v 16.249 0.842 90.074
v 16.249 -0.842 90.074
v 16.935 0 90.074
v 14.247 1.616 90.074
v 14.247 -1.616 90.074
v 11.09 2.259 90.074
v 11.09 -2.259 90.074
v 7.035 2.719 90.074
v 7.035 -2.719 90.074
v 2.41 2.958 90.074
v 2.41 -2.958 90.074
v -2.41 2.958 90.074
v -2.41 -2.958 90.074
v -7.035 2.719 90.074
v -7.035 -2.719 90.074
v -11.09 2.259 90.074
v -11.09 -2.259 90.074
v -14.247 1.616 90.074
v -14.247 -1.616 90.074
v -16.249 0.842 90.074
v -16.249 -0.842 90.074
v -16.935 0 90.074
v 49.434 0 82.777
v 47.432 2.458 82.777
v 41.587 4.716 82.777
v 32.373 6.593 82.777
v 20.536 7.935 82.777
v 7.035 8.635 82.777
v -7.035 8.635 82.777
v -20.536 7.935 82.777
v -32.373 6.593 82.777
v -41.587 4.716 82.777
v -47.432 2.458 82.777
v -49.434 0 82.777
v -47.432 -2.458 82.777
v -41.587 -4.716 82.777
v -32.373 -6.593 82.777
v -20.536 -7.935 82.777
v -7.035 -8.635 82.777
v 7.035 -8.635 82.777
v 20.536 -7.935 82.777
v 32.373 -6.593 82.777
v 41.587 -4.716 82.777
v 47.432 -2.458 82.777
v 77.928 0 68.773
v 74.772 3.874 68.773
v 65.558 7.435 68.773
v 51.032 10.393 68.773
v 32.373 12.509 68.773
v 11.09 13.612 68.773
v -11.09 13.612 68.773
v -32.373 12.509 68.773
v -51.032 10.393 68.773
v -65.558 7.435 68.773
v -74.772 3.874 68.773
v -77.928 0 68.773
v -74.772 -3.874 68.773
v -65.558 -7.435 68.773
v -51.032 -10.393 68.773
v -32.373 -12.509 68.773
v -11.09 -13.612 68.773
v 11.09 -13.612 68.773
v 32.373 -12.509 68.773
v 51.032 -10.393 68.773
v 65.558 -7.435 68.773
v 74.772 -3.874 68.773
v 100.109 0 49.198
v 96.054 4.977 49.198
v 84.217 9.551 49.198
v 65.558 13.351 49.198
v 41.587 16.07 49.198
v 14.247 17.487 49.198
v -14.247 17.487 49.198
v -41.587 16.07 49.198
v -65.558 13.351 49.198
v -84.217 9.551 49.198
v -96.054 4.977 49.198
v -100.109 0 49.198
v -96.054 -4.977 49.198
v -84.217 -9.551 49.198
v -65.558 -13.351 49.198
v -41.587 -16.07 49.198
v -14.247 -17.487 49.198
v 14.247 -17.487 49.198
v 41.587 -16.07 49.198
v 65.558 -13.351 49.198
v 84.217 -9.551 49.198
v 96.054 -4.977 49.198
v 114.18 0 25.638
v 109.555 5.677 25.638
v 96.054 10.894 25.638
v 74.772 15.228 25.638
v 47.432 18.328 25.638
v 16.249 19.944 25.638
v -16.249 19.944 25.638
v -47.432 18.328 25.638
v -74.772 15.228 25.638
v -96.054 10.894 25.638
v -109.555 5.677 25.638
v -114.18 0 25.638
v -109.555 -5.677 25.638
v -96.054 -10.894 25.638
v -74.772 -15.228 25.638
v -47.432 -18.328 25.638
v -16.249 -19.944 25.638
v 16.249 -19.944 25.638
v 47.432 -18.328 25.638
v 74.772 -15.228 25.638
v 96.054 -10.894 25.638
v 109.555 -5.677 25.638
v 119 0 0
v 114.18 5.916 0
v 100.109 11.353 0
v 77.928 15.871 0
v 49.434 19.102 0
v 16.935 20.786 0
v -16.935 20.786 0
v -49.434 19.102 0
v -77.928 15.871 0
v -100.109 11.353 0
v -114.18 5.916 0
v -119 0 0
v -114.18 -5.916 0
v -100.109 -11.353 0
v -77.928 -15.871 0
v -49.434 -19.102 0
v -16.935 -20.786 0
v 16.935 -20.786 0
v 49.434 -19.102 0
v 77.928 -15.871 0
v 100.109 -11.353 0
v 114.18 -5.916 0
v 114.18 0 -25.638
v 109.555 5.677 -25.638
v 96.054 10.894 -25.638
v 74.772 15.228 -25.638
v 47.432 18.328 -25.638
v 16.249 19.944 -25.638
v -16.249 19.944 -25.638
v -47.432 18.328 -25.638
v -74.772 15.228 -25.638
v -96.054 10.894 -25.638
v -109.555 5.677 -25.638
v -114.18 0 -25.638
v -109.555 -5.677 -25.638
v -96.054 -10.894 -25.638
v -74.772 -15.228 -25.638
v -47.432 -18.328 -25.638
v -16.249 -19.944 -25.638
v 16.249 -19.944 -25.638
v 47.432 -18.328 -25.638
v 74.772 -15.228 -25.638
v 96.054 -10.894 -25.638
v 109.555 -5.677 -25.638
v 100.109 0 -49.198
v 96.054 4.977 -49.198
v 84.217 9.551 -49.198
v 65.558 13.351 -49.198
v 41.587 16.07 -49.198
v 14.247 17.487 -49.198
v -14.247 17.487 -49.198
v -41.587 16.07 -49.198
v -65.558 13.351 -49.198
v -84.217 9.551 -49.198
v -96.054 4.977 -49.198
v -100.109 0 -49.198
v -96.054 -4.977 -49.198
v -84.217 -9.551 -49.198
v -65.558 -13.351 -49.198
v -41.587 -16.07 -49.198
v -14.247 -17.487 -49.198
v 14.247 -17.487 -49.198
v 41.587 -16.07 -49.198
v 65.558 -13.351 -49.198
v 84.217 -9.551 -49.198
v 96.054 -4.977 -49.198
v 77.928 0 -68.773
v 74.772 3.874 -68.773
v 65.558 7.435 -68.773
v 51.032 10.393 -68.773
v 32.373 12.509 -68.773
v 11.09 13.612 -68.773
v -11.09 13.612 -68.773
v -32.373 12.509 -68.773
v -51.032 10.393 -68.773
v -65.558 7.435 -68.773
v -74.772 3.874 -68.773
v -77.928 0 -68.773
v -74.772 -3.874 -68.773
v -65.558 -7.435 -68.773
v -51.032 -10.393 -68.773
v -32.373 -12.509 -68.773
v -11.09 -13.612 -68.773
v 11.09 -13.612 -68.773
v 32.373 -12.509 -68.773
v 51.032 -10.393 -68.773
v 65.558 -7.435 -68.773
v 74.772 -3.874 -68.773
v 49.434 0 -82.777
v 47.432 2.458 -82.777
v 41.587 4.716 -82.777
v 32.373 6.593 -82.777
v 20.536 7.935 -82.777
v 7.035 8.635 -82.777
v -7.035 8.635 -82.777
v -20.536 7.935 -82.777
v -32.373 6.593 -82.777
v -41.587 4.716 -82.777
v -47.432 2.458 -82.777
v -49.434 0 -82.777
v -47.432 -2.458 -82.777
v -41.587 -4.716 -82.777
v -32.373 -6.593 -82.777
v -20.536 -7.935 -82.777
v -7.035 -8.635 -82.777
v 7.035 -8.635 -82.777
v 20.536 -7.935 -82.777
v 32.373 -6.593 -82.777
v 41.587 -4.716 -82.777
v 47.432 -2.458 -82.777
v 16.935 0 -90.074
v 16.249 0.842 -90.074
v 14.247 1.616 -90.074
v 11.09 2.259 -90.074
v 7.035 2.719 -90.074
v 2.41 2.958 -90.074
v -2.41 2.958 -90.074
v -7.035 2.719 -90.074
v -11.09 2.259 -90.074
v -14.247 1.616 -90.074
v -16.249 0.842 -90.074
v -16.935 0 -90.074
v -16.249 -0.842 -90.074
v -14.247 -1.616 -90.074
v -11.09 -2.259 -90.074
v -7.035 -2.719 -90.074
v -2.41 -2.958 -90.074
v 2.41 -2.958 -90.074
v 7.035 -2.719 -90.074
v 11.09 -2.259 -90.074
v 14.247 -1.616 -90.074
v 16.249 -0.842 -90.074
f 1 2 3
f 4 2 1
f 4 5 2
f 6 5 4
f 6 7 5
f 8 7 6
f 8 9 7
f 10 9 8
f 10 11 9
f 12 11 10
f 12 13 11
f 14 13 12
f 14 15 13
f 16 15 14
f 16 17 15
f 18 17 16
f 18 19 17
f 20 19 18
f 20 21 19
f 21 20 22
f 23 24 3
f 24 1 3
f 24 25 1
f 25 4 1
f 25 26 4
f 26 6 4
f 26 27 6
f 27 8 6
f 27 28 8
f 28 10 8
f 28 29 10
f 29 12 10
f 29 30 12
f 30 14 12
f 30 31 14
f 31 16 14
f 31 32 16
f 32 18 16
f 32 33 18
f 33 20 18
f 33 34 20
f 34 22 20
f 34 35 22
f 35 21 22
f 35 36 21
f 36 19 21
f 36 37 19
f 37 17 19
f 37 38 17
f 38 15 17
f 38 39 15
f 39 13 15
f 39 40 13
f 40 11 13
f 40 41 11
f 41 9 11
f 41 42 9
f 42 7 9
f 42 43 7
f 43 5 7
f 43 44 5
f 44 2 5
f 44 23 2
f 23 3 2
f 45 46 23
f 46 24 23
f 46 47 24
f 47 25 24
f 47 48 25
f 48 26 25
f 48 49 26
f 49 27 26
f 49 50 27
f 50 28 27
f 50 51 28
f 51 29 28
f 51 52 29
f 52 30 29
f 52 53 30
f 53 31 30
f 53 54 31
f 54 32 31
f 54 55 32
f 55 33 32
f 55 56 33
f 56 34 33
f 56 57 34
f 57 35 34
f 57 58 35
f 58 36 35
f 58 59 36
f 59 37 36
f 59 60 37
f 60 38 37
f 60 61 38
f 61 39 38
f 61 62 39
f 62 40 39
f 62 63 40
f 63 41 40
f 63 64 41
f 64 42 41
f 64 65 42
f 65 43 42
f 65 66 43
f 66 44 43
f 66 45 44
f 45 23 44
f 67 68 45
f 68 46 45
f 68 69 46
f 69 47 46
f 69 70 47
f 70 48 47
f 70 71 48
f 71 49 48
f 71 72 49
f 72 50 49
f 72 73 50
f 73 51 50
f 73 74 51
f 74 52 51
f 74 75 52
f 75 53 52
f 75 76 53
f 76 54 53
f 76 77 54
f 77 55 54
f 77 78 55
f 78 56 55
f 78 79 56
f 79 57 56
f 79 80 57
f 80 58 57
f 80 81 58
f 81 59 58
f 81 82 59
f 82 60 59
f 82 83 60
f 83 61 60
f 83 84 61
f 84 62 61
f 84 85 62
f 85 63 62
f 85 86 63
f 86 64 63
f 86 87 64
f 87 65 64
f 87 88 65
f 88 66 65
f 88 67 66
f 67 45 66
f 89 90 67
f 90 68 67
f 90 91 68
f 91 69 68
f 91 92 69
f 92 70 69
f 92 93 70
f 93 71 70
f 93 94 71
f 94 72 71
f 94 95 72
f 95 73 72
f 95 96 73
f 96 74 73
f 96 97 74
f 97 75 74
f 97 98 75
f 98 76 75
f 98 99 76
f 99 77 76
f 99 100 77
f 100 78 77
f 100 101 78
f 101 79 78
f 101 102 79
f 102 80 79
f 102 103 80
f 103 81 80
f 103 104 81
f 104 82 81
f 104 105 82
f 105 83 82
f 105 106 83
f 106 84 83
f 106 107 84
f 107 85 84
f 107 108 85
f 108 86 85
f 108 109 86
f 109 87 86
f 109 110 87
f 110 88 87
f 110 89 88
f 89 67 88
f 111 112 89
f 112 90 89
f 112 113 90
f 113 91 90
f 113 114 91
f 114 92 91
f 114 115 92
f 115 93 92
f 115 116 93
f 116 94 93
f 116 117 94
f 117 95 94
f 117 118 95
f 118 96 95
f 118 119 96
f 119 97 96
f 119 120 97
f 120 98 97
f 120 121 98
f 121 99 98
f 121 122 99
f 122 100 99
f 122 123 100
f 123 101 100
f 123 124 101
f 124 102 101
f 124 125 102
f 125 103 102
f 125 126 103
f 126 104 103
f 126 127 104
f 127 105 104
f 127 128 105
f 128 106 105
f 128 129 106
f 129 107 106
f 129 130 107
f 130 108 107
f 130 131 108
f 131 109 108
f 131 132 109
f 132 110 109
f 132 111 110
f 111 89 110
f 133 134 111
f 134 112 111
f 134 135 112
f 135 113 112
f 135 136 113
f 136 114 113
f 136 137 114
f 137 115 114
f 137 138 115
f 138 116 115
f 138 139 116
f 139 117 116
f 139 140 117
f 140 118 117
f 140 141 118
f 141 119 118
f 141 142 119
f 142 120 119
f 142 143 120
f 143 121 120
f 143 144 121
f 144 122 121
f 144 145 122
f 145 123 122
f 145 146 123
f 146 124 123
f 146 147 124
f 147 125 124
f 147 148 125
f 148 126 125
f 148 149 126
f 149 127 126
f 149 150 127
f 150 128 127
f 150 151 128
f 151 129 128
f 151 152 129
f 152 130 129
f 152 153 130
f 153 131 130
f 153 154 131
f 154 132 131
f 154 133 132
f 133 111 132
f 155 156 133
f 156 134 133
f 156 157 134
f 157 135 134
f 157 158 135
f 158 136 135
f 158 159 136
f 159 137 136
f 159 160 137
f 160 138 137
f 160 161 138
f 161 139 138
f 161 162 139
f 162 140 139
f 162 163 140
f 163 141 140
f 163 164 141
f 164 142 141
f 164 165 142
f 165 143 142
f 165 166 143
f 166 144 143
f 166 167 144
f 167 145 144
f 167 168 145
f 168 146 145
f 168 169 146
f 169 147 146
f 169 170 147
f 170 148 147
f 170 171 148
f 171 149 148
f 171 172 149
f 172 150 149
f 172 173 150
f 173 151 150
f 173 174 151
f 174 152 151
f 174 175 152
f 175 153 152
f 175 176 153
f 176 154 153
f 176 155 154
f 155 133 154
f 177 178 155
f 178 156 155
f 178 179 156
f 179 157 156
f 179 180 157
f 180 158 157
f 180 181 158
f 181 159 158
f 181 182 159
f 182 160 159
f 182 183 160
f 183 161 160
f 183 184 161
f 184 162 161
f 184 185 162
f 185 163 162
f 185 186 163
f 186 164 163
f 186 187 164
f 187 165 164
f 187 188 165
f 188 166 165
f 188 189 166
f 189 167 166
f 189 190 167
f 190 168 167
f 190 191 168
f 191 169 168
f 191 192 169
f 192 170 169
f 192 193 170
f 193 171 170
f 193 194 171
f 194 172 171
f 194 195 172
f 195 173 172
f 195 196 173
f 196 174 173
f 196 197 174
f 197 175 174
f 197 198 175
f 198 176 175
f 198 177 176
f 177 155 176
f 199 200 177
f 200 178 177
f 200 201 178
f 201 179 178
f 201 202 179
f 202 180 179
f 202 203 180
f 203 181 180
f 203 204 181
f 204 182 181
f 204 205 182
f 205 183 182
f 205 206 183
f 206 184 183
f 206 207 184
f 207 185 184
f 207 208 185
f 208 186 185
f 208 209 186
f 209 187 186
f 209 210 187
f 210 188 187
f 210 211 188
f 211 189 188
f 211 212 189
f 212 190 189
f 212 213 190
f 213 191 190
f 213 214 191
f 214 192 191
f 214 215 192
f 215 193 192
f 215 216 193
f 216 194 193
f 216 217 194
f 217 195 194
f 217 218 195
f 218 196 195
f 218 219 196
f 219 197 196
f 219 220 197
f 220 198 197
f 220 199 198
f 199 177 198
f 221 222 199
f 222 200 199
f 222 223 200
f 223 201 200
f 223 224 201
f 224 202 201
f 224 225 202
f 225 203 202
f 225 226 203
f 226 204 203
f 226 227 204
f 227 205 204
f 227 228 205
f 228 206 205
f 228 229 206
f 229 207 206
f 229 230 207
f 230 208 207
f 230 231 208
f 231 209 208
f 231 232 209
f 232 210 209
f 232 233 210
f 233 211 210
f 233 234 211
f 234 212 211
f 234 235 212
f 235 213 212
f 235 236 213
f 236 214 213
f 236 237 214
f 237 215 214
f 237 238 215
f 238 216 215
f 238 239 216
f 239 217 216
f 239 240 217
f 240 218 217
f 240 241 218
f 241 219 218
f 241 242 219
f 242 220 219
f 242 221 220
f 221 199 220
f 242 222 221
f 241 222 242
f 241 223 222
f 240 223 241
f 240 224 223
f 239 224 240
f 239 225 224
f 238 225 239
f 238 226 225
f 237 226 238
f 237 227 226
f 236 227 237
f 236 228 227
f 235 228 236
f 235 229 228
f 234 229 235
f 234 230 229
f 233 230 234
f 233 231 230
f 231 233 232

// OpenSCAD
// Generated by SolidPython 1.0.1 on 2020-07-29 00:46:52


scale(v = [17, 3, 13]) {
	sphere(r = 7);
}
/***********************************************
*********      SolidPython code:      **********
************************************************
 
# import packages: SolidPython
from solid import *
from solid.utils import *
from itertools import chain, combinations, permutations


class Resize:

    def __init__(self, scad_file):
        self.scad_file = scad_file
        #self.scad_file = import_scad(scad_file)
        # cone/cylinder param:
        self.r1 = 0
        self.r2 = 0
        self.h = 0
        # rectangular prism param:
        self.w = 0
        self.l = 0
        # ellipse param:
        self.r = 0

    # import OpenScad code (file name corresponds to shape)


    # classify shape + parameters
    def assign(self, param1, param2, param3):
        if self.scad_file == 'cone.scad':
            self.r1 = param1
            self.r2 = param2
            self.h = param3
        elif self.scad_file == 'cylinder.scad':
            self.r1 = param1
            self.r2 = param2
            self.h = param3
        elif self.scad_file == 'rectangularPrism.scad':
            self.h = param1
            self.l = param2
            self.w = param3
        else:
            self.r = param1
            self.h = param2

    # resize parameters
    def iterate(self):
        x = range(3, 20, 2)
        i = 1
        if self.scad_file == 'cone.scad':
            tempList = list(permutations(x, 2))
            for temp in tempList:
                param1 = temp[0]
                param2 = temp[1]
                filepath = 'produced_scad_files/' + 'cone' + str(param1) + '_' + str(param2) + '_' + '.scad'
                scad_render_to_file(cylinder(h=param1, r1=param2, r2=0), filepath)

        elif self.scad_file == 'cylinder.scad':
            tempList = list(permutations(x, 3))
            for temp in tempList:
                param1 = temp[0]
                param2 = temp[1]
                filepath = 'produced_scad_files/' + 'cylinder' + str(param1) + '_' + str(param2) + '_' + '.scad'
                scad_render_to_file(cylinder(h=param1, r1=param2, r2=param2), filepath)

        elif self.scad_file == 'rectangularPrism.scad':
            tempList = list(permutations(x, 3))
            for temp in tempList:
                param1 = temp[0]
                param2 = temp[1]
                param3 = temp[2]
                filepath = 'produced_scad_files/' + 'rectangularPrism' + str(param1) + '_' + str(param2) + '_' + str(
                    param3) + '.scad'
                scad_render_to_file(cube(size=(param1, param2, param3)), filepath)

        elif self.scad_file == 'ellipse.scad':
            tempList = list(permutations(x, 4))
            for temp in tempList:
                param1 = temp[0]
                param2 = temp[1]
                param3 = temp[2]
                param4 = temp[3]
                filepath = 'produced_scad_files/' + 'ellipse' + str(param1) + '_' + str(param2) + '_' + str(param3) + '_' + str(param4) + '.scad'
                scad_render_to_file(scale([param1, param2, param3])(sphere(r=param4)), filepath)

    def render_to_scadfile(self):
        scad_render_to_file(scad, 'example.scad') 
 
************************************************/
